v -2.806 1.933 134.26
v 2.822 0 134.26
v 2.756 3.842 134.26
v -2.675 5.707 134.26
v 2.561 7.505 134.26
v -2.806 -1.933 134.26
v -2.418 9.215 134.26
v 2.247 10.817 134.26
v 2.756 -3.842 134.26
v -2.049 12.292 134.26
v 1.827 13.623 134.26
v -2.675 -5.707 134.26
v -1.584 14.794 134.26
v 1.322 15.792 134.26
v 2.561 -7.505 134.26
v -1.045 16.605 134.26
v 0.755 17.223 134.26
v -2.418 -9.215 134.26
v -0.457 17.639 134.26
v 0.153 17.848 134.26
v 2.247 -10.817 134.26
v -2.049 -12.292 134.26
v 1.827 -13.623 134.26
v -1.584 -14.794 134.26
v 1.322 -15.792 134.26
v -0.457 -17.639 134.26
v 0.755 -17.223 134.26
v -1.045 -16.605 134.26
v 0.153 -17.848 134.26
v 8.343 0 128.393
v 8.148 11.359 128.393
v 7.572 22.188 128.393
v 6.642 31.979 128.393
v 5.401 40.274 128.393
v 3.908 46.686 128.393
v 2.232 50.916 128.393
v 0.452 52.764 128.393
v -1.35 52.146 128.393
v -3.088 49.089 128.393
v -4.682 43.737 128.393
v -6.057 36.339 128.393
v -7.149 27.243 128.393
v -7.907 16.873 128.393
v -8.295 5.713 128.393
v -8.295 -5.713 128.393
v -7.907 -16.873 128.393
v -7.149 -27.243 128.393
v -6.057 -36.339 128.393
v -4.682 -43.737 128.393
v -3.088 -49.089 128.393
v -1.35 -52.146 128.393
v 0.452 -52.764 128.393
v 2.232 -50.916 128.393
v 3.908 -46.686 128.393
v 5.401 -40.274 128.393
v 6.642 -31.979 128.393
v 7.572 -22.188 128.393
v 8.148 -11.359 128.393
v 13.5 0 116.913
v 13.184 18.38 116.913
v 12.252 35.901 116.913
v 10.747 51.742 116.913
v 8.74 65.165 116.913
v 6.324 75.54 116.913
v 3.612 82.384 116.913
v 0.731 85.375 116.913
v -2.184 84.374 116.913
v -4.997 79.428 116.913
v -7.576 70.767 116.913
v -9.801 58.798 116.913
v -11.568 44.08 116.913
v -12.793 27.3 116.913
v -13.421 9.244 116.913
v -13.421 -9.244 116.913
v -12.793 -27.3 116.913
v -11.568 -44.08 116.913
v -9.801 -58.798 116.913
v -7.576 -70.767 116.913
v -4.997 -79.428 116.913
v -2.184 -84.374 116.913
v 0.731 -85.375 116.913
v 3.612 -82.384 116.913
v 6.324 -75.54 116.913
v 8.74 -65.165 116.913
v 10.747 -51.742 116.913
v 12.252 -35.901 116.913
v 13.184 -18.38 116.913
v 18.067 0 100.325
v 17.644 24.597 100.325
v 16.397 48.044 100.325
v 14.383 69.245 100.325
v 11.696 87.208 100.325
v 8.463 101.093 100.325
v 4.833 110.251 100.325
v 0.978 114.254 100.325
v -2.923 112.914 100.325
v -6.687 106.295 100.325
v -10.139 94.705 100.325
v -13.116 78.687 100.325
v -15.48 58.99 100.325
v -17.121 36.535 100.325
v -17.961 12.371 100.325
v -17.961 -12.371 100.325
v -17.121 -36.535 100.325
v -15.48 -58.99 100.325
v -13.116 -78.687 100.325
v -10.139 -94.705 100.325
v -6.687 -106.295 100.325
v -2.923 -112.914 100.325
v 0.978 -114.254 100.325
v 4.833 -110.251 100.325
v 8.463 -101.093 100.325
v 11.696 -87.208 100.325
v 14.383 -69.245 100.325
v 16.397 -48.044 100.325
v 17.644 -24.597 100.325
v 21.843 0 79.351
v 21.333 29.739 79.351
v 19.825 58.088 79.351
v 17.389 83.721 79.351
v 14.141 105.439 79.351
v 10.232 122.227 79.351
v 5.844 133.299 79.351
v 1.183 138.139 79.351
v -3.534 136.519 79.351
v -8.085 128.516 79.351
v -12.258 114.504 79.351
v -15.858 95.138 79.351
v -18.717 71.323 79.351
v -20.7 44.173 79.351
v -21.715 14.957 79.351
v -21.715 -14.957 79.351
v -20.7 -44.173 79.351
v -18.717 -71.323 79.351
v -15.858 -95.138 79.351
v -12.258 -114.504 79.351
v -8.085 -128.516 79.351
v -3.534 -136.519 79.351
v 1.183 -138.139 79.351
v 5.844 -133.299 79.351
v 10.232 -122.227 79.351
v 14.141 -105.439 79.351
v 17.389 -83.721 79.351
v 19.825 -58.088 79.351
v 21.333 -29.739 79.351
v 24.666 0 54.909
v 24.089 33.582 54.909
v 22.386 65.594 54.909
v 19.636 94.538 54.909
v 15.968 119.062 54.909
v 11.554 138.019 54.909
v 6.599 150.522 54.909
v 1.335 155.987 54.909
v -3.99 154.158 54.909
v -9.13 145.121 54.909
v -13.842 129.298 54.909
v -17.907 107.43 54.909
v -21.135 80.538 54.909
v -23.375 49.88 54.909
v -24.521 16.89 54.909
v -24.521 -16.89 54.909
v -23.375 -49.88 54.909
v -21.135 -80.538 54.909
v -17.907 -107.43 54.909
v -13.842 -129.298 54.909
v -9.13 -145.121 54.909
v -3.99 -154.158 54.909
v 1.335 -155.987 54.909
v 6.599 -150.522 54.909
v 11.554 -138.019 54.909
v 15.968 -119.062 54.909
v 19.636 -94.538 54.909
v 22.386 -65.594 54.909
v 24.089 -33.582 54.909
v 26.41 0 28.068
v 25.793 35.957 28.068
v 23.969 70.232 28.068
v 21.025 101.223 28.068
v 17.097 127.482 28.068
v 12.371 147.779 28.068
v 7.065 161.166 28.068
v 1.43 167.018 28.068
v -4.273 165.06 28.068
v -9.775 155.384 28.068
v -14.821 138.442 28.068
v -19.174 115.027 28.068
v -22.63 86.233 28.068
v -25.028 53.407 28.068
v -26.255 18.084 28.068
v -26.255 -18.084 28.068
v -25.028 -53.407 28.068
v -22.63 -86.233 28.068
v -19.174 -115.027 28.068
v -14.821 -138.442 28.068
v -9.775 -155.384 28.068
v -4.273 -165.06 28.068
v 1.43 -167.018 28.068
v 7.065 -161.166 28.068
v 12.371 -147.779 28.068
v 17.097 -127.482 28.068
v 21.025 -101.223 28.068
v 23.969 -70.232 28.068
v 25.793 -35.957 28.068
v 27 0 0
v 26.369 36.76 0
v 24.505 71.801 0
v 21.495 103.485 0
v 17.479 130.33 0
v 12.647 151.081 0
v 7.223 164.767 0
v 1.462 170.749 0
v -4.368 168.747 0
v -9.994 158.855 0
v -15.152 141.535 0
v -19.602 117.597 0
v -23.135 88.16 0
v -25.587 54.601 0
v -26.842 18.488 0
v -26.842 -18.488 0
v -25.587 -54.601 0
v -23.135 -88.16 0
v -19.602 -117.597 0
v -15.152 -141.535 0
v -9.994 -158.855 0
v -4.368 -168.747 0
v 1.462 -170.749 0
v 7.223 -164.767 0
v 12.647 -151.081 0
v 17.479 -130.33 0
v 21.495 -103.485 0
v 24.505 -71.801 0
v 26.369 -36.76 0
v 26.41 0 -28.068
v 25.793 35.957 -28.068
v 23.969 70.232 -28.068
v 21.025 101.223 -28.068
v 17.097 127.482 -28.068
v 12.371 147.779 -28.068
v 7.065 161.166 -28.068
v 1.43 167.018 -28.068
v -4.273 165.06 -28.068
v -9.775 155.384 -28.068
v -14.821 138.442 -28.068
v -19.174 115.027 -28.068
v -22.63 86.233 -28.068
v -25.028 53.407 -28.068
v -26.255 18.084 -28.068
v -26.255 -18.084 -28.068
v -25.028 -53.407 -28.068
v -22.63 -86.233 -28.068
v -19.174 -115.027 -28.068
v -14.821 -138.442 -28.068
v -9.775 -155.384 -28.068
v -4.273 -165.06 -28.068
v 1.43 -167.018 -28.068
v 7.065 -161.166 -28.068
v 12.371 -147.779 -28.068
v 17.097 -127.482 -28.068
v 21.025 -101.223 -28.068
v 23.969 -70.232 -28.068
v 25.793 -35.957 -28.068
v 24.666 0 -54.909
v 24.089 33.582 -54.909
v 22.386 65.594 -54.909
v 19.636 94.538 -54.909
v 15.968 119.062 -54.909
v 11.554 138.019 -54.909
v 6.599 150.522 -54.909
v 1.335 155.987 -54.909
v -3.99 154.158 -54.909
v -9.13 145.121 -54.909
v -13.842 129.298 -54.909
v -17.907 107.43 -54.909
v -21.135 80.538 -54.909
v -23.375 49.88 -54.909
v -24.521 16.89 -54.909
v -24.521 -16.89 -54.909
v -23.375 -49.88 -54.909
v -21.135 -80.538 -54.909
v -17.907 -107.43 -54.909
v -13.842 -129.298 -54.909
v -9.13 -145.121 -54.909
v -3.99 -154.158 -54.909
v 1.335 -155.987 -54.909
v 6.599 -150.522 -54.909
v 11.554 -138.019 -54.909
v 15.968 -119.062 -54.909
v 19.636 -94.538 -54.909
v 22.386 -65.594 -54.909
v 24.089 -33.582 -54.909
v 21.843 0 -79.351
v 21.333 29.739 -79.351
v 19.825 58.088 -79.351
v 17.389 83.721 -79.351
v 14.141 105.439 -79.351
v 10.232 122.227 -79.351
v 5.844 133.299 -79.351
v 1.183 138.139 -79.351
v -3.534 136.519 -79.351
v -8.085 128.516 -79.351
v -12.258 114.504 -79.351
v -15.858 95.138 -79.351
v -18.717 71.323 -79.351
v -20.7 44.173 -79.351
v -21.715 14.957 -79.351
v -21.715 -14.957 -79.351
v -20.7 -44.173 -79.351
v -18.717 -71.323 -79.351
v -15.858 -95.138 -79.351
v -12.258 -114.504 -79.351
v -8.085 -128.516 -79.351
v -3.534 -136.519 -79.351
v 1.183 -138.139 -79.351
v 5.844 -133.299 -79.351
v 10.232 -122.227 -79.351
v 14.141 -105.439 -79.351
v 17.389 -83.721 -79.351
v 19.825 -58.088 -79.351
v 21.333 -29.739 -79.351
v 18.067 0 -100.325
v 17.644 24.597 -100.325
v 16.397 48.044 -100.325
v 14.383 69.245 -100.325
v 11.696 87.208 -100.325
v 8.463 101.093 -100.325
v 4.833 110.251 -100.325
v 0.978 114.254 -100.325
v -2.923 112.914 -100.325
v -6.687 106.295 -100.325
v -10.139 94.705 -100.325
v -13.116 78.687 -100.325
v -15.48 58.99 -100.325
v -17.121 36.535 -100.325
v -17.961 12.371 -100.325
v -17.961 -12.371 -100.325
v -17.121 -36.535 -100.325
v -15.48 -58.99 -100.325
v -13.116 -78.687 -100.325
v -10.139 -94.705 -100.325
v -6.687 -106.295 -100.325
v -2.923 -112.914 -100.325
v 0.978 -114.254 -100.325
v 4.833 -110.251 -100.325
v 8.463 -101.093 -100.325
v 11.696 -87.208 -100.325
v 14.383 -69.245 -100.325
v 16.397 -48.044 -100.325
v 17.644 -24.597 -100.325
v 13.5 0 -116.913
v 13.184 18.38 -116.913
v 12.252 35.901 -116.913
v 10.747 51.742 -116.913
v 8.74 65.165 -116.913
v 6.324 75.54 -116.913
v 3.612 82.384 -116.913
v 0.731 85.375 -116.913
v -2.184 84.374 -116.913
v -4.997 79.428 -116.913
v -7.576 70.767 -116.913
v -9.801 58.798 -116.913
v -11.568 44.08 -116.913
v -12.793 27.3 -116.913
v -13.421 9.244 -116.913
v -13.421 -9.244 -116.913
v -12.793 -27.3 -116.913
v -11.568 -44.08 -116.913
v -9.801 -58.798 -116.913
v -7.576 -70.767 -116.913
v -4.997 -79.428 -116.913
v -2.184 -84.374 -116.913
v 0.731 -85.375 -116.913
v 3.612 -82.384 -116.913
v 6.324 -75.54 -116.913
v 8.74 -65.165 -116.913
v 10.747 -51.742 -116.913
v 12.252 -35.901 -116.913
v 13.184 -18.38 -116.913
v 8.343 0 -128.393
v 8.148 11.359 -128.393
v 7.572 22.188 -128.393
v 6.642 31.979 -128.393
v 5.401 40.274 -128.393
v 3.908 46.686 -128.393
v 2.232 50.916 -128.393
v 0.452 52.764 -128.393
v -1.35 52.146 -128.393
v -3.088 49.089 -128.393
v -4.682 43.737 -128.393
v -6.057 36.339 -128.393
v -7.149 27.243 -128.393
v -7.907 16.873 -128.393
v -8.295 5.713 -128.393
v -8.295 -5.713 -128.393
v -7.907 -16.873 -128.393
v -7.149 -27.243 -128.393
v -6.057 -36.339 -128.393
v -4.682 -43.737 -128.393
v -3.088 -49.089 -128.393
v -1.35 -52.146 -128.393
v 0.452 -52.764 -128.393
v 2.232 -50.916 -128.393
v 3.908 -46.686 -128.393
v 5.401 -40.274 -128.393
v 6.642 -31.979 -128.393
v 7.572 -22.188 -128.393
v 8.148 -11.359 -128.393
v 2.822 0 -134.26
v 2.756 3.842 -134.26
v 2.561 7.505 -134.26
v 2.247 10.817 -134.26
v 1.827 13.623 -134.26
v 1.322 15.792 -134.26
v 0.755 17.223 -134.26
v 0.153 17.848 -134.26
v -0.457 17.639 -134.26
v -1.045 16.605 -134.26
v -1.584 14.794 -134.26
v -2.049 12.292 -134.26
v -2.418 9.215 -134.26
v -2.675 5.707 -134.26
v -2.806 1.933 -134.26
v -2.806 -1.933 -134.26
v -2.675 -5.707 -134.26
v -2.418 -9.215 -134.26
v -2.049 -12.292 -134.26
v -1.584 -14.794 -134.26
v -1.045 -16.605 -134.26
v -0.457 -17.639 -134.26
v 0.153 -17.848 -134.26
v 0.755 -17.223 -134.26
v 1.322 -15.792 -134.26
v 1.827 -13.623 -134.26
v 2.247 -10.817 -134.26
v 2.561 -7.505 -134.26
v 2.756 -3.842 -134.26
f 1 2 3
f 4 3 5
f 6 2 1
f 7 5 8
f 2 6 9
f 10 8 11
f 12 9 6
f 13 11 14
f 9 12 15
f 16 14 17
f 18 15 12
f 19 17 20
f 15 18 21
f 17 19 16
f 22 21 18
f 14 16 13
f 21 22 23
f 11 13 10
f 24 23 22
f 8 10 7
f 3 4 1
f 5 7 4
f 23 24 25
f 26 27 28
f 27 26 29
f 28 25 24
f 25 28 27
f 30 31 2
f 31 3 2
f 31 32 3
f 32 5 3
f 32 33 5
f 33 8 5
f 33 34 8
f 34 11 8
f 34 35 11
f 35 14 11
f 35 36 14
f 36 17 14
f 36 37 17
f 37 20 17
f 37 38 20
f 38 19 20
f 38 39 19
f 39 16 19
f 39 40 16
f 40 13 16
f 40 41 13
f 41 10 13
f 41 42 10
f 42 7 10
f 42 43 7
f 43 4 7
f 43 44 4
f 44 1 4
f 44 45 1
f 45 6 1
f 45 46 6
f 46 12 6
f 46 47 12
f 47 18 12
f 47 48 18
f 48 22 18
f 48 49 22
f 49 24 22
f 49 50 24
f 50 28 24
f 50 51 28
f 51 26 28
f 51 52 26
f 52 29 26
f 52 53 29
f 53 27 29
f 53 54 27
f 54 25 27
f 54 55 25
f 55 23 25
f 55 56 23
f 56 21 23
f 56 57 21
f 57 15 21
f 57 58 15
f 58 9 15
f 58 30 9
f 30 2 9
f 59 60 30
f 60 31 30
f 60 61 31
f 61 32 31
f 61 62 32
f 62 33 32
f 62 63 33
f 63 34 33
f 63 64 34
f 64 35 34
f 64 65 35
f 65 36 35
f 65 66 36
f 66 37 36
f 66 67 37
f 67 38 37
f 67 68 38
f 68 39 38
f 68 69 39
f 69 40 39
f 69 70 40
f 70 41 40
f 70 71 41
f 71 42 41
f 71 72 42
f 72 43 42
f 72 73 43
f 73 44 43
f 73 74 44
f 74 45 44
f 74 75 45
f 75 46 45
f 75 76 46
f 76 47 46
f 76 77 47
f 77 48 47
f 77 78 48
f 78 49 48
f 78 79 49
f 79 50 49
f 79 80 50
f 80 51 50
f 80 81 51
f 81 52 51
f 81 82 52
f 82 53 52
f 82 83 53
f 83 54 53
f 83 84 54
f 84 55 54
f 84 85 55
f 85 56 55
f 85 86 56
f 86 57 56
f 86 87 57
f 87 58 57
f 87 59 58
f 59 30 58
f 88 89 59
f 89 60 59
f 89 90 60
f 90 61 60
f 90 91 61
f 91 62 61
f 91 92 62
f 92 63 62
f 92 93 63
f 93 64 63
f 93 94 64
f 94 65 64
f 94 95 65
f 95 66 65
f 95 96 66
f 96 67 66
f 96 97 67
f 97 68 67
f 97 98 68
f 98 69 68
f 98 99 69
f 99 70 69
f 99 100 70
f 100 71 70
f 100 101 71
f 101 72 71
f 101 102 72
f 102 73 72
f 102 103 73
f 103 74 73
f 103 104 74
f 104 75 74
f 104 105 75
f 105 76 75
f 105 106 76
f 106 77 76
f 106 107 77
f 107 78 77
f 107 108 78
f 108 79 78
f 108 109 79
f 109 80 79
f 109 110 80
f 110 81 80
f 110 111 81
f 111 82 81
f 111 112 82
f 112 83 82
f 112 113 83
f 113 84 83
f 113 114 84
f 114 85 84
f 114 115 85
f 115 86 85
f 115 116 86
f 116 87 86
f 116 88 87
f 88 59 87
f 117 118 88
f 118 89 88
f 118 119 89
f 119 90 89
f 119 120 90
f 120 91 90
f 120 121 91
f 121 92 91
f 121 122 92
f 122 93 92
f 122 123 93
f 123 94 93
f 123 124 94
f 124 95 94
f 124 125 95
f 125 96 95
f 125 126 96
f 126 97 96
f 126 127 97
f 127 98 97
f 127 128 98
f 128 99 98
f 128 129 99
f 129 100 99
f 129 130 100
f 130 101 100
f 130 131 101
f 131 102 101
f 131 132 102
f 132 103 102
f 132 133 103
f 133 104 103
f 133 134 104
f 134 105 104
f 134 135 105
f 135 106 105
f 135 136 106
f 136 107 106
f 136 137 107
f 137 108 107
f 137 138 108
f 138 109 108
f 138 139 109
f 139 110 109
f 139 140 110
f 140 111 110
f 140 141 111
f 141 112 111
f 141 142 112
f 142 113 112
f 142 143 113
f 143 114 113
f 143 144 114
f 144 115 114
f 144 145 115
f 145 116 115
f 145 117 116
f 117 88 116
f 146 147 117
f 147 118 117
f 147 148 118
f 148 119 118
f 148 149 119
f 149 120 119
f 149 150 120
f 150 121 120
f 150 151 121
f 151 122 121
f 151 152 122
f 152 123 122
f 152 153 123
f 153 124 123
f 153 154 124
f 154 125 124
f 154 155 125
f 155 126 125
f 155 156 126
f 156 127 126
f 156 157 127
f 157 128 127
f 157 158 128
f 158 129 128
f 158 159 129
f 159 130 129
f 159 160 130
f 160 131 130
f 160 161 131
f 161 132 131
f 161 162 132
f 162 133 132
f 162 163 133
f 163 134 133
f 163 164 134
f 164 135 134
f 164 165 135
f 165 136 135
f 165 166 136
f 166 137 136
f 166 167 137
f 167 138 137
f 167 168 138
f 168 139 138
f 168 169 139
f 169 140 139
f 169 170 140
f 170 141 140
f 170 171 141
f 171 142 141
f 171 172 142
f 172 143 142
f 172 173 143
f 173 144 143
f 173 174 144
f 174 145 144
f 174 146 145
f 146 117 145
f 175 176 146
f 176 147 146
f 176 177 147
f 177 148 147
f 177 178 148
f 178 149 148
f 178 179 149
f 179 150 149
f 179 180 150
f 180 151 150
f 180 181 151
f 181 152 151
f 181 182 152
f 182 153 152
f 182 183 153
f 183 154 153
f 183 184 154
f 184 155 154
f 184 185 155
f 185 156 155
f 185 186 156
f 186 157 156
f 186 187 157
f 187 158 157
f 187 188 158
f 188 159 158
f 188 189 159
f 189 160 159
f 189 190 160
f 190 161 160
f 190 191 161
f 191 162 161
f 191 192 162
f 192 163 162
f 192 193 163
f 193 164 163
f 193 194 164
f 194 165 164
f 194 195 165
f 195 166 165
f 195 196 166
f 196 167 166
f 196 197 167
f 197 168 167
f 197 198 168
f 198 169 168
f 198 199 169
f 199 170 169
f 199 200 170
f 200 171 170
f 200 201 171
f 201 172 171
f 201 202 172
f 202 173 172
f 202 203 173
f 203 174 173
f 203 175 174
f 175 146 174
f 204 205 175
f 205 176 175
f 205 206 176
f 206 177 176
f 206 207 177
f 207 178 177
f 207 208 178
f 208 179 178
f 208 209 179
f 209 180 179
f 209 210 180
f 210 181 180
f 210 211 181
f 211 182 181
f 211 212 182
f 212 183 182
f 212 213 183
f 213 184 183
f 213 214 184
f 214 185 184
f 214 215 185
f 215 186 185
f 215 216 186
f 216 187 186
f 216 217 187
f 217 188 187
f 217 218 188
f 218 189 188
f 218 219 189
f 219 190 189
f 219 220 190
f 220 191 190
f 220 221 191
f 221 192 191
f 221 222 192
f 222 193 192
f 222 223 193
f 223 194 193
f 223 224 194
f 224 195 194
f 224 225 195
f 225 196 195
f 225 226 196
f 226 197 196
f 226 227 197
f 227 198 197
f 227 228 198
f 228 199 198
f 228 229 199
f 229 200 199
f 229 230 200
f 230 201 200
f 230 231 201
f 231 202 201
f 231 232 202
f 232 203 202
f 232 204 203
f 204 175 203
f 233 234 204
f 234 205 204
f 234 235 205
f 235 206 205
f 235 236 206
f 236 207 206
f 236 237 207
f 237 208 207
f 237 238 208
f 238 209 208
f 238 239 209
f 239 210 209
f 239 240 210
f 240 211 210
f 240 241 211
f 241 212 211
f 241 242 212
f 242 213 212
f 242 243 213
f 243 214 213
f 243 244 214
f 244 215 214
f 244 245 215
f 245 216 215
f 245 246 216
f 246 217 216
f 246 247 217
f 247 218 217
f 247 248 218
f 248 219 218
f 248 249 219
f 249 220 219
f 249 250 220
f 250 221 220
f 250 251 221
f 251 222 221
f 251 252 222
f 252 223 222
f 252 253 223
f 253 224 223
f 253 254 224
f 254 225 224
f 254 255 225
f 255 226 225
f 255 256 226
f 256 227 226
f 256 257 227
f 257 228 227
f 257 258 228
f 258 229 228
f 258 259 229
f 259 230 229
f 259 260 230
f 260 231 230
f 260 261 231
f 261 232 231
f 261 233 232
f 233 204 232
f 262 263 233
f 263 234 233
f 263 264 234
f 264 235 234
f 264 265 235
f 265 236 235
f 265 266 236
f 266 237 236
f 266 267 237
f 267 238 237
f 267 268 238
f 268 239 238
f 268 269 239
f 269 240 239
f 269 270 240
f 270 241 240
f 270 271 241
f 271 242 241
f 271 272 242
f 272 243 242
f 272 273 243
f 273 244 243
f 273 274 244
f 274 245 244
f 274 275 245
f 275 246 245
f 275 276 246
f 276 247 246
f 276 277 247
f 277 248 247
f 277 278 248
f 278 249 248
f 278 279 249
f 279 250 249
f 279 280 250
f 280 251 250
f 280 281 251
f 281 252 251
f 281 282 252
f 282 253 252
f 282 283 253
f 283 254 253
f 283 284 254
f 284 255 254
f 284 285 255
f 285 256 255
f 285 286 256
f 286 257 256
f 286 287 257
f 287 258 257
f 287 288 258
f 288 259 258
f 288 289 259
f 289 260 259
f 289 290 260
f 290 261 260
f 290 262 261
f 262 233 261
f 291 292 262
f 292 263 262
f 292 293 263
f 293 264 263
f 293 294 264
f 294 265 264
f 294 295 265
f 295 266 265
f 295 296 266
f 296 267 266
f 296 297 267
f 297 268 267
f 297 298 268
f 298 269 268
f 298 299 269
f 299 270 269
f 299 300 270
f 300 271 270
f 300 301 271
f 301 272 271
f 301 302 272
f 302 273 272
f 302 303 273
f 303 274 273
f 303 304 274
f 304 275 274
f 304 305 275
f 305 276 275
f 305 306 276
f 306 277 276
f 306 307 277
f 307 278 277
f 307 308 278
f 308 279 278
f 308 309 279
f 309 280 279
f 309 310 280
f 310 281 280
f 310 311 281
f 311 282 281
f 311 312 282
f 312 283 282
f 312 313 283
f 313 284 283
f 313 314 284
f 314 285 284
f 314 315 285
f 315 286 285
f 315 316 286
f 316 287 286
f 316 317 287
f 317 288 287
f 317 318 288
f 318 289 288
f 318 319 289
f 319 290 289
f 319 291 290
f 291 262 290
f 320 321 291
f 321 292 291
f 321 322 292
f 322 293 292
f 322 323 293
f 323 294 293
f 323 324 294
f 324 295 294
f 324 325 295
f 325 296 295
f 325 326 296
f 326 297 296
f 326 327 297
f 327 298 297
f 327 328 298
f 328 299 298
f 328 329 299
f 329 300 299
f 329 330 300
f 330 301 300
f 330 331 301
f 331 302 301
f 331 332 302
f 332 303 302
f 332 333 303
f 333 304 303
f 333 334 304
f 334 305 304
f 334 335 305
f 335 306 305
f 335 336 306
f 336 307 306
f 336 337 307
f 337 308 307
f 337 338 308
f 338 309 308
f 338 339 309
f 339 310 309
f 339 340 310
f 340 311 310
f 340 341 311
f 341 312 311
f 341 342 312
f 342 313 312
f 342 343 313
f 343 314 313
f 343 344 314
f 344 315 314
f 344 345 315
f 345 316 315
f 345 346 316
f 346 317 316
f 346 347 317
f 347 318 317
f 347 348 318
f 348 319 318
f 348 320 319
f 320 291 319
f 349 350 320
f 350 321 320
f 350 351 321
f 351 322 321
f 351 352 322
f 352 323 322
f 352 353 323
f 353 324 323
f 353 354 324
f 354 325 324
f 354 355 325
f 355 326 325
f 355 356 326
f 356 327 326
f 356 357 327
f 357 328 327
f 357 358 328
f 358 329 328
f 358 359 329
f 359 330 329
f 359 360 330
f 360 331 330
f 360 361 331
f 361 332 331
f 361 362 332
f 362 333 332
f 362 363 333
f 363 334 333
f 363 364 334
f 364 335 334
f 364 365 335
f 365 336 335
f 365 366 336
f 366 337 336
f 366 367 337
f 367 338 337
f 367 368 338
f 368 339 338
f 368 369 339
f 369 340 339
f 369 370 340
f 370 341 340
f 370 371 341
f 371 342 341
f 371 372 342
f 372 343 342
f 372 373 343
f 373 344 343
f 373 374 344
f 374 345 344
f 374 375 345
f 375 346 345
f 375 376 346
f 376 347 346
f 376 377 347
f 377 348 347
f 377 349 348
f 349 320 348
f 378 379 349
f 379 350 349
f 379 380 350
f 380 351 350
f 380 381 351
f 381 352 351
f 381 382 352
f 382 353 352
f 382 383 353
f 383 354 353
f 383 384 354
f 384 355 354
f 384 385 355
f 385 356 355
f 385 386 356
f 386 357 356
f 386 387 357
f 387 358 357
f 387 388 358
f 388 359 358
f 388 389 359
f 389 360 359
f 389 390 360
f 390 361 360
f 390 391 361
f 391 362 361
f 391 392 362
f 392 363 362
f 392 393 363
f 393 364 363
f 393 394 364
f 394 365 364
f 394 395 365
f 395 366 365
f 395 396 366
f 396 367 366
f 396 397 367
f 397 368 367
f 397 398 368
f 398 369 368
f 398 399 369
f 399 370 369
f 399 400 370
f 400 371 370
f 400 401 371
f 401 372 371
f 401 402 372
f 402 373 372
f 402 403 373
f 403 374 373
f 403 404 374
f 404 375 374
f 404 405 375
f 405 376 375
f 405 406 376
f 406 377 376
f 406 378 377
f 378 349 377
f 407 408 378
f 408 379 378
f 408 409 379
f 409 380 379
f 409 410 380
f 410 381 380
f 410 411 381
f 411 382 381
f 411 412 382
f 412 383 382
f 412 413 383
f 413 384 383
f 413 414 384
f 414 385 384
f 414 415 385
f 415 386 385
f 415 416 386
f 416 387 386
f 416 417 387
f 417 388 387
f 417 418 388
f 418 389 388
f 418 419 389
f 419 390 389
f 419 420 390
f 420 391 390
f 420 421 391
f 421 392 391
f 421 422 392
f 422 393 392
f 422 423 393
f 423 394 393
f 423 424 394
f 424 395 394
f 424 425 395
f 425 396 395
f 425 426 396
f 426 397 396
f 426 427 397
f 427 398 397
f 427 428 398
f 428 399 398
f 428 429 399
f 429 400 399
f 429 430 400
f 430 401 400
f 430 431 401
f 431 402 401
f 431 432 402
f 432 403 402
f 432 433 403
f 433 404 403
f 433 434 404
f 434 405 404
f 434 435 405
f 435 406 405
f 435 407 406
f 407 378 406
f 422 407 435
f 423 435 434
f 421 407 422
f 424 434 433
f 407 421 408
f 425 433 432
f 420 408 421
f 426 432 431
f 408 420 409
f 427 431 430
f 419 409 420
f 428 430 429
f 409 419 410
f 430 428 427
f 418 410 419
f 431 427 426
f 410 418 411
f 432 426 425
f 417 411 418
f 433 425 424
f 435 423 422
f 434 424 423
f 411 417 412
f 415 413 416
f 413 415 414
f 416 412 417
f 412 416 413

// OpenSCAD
// Generated by SolidPython 1.0.1 on 2020-07-29 00:46:46


scale(v = [3, 19, 15]) {
	sphere(r = 9);
}
/***********************************************
*********      SolidPython code:      **********
************************************************
 
# import packages: SolidPython
from solid import *
from solid.utils import *
from itertools import chain, combinations, permutations


class Resize:

    def __init__(self, scad_file):
        self.scad_file = scad_file
        #self.scad_file = import_scad(scad_file)
        # cone/cylinder param:
        self.r1 = 0
        self.r2 = 0
        self.h = 0
        # rectangular prism param:
        self.w = 0
        self.l = 0
        # ellipse param:
        self.r = 0

    # import OpenScad code (file name corresponds to shape)


    # classify shape + parameters
    def assign(self, param1, param2, param3):
        if self.scad_file == 'cone.scad':
            self.r1 = param1
            self.r2 = param2
            self.h = param3
        elif self.scad_file == 'cylinder.scad':
            self.r1 = param1
            self.r2 = param2
            self.h = param3
        elif self.scad_file == 'rectangularPrism.scad':
            self.h = param1
            self.l = param2
            self.w = param3
        else:
            self.r = param1
            self.h = param2

    # resize parameters
    def iterate(self):
        x = range(3, 20, 2)
        i = 1
        if self.scad_file == 'cone.scad':
            tempList = list(permutations(x, 2))
            for temp in tempList:
                param1 = temp[0]
                param2 = temp[1]
                filepath = 'produced_scad_files/' + 'cone' + str(param1) + '_' + str(param2) + '_' + '.scad'
                scad_render_to_file(cylinder(h=param1, r1=param2, r2=0), filepath)

        elif self.scad_file == 'cylinder.scad':
            tempList = list(permutations(x, 3))
            for temp in tempList:
                param1 = temp[0]
                param2 = temp[1]
                filepath = 'produced_scad_files/' + 'cylinder' + str(param1) + '_' + str(param2) + '_' + '.scad'
                scad_render_to_file(cylinder(h=param1, r1=param2, r2=param2), filepath)

        elif self.scad_file == 'rectangularPrism.scad':
            tempList = list(permutations(x, 3))
            for temp in tempList:
                param1 = temp[0]
                param2 = temp[1]
                param3 = temp[2]
                filepath = 'produced_scad_files/' + 'rectangularPrism' + str(param1) + '_' + str(param2) + '_' + str(
                    param3) + '.scad'
                scad_render_to_file(cube(size=(param1, param2, param3)), filepath)

        elif self.scad_file == 'ellipse.scad':
            tempList = list(permutations(x, 4))
            for temp in tempList:
                param1 = temp[0]
                param2 = temp[1]
                param3 = temp[2]
                param4 = temp[3]
                filepath = 'produced_scad_files/' + 'ellipse' + str(param1) + '_' + str(param2) + '_' + str(param3) + '_' + str(param4) + '.scad'
                scad_render_to_file(scale([param1, param2, param3])(sphere(r=param4)), filepath)

    def render_to_scadfile(self):
        scad_render_to_file(scad, 'example.scad') 
 
************************************************/
